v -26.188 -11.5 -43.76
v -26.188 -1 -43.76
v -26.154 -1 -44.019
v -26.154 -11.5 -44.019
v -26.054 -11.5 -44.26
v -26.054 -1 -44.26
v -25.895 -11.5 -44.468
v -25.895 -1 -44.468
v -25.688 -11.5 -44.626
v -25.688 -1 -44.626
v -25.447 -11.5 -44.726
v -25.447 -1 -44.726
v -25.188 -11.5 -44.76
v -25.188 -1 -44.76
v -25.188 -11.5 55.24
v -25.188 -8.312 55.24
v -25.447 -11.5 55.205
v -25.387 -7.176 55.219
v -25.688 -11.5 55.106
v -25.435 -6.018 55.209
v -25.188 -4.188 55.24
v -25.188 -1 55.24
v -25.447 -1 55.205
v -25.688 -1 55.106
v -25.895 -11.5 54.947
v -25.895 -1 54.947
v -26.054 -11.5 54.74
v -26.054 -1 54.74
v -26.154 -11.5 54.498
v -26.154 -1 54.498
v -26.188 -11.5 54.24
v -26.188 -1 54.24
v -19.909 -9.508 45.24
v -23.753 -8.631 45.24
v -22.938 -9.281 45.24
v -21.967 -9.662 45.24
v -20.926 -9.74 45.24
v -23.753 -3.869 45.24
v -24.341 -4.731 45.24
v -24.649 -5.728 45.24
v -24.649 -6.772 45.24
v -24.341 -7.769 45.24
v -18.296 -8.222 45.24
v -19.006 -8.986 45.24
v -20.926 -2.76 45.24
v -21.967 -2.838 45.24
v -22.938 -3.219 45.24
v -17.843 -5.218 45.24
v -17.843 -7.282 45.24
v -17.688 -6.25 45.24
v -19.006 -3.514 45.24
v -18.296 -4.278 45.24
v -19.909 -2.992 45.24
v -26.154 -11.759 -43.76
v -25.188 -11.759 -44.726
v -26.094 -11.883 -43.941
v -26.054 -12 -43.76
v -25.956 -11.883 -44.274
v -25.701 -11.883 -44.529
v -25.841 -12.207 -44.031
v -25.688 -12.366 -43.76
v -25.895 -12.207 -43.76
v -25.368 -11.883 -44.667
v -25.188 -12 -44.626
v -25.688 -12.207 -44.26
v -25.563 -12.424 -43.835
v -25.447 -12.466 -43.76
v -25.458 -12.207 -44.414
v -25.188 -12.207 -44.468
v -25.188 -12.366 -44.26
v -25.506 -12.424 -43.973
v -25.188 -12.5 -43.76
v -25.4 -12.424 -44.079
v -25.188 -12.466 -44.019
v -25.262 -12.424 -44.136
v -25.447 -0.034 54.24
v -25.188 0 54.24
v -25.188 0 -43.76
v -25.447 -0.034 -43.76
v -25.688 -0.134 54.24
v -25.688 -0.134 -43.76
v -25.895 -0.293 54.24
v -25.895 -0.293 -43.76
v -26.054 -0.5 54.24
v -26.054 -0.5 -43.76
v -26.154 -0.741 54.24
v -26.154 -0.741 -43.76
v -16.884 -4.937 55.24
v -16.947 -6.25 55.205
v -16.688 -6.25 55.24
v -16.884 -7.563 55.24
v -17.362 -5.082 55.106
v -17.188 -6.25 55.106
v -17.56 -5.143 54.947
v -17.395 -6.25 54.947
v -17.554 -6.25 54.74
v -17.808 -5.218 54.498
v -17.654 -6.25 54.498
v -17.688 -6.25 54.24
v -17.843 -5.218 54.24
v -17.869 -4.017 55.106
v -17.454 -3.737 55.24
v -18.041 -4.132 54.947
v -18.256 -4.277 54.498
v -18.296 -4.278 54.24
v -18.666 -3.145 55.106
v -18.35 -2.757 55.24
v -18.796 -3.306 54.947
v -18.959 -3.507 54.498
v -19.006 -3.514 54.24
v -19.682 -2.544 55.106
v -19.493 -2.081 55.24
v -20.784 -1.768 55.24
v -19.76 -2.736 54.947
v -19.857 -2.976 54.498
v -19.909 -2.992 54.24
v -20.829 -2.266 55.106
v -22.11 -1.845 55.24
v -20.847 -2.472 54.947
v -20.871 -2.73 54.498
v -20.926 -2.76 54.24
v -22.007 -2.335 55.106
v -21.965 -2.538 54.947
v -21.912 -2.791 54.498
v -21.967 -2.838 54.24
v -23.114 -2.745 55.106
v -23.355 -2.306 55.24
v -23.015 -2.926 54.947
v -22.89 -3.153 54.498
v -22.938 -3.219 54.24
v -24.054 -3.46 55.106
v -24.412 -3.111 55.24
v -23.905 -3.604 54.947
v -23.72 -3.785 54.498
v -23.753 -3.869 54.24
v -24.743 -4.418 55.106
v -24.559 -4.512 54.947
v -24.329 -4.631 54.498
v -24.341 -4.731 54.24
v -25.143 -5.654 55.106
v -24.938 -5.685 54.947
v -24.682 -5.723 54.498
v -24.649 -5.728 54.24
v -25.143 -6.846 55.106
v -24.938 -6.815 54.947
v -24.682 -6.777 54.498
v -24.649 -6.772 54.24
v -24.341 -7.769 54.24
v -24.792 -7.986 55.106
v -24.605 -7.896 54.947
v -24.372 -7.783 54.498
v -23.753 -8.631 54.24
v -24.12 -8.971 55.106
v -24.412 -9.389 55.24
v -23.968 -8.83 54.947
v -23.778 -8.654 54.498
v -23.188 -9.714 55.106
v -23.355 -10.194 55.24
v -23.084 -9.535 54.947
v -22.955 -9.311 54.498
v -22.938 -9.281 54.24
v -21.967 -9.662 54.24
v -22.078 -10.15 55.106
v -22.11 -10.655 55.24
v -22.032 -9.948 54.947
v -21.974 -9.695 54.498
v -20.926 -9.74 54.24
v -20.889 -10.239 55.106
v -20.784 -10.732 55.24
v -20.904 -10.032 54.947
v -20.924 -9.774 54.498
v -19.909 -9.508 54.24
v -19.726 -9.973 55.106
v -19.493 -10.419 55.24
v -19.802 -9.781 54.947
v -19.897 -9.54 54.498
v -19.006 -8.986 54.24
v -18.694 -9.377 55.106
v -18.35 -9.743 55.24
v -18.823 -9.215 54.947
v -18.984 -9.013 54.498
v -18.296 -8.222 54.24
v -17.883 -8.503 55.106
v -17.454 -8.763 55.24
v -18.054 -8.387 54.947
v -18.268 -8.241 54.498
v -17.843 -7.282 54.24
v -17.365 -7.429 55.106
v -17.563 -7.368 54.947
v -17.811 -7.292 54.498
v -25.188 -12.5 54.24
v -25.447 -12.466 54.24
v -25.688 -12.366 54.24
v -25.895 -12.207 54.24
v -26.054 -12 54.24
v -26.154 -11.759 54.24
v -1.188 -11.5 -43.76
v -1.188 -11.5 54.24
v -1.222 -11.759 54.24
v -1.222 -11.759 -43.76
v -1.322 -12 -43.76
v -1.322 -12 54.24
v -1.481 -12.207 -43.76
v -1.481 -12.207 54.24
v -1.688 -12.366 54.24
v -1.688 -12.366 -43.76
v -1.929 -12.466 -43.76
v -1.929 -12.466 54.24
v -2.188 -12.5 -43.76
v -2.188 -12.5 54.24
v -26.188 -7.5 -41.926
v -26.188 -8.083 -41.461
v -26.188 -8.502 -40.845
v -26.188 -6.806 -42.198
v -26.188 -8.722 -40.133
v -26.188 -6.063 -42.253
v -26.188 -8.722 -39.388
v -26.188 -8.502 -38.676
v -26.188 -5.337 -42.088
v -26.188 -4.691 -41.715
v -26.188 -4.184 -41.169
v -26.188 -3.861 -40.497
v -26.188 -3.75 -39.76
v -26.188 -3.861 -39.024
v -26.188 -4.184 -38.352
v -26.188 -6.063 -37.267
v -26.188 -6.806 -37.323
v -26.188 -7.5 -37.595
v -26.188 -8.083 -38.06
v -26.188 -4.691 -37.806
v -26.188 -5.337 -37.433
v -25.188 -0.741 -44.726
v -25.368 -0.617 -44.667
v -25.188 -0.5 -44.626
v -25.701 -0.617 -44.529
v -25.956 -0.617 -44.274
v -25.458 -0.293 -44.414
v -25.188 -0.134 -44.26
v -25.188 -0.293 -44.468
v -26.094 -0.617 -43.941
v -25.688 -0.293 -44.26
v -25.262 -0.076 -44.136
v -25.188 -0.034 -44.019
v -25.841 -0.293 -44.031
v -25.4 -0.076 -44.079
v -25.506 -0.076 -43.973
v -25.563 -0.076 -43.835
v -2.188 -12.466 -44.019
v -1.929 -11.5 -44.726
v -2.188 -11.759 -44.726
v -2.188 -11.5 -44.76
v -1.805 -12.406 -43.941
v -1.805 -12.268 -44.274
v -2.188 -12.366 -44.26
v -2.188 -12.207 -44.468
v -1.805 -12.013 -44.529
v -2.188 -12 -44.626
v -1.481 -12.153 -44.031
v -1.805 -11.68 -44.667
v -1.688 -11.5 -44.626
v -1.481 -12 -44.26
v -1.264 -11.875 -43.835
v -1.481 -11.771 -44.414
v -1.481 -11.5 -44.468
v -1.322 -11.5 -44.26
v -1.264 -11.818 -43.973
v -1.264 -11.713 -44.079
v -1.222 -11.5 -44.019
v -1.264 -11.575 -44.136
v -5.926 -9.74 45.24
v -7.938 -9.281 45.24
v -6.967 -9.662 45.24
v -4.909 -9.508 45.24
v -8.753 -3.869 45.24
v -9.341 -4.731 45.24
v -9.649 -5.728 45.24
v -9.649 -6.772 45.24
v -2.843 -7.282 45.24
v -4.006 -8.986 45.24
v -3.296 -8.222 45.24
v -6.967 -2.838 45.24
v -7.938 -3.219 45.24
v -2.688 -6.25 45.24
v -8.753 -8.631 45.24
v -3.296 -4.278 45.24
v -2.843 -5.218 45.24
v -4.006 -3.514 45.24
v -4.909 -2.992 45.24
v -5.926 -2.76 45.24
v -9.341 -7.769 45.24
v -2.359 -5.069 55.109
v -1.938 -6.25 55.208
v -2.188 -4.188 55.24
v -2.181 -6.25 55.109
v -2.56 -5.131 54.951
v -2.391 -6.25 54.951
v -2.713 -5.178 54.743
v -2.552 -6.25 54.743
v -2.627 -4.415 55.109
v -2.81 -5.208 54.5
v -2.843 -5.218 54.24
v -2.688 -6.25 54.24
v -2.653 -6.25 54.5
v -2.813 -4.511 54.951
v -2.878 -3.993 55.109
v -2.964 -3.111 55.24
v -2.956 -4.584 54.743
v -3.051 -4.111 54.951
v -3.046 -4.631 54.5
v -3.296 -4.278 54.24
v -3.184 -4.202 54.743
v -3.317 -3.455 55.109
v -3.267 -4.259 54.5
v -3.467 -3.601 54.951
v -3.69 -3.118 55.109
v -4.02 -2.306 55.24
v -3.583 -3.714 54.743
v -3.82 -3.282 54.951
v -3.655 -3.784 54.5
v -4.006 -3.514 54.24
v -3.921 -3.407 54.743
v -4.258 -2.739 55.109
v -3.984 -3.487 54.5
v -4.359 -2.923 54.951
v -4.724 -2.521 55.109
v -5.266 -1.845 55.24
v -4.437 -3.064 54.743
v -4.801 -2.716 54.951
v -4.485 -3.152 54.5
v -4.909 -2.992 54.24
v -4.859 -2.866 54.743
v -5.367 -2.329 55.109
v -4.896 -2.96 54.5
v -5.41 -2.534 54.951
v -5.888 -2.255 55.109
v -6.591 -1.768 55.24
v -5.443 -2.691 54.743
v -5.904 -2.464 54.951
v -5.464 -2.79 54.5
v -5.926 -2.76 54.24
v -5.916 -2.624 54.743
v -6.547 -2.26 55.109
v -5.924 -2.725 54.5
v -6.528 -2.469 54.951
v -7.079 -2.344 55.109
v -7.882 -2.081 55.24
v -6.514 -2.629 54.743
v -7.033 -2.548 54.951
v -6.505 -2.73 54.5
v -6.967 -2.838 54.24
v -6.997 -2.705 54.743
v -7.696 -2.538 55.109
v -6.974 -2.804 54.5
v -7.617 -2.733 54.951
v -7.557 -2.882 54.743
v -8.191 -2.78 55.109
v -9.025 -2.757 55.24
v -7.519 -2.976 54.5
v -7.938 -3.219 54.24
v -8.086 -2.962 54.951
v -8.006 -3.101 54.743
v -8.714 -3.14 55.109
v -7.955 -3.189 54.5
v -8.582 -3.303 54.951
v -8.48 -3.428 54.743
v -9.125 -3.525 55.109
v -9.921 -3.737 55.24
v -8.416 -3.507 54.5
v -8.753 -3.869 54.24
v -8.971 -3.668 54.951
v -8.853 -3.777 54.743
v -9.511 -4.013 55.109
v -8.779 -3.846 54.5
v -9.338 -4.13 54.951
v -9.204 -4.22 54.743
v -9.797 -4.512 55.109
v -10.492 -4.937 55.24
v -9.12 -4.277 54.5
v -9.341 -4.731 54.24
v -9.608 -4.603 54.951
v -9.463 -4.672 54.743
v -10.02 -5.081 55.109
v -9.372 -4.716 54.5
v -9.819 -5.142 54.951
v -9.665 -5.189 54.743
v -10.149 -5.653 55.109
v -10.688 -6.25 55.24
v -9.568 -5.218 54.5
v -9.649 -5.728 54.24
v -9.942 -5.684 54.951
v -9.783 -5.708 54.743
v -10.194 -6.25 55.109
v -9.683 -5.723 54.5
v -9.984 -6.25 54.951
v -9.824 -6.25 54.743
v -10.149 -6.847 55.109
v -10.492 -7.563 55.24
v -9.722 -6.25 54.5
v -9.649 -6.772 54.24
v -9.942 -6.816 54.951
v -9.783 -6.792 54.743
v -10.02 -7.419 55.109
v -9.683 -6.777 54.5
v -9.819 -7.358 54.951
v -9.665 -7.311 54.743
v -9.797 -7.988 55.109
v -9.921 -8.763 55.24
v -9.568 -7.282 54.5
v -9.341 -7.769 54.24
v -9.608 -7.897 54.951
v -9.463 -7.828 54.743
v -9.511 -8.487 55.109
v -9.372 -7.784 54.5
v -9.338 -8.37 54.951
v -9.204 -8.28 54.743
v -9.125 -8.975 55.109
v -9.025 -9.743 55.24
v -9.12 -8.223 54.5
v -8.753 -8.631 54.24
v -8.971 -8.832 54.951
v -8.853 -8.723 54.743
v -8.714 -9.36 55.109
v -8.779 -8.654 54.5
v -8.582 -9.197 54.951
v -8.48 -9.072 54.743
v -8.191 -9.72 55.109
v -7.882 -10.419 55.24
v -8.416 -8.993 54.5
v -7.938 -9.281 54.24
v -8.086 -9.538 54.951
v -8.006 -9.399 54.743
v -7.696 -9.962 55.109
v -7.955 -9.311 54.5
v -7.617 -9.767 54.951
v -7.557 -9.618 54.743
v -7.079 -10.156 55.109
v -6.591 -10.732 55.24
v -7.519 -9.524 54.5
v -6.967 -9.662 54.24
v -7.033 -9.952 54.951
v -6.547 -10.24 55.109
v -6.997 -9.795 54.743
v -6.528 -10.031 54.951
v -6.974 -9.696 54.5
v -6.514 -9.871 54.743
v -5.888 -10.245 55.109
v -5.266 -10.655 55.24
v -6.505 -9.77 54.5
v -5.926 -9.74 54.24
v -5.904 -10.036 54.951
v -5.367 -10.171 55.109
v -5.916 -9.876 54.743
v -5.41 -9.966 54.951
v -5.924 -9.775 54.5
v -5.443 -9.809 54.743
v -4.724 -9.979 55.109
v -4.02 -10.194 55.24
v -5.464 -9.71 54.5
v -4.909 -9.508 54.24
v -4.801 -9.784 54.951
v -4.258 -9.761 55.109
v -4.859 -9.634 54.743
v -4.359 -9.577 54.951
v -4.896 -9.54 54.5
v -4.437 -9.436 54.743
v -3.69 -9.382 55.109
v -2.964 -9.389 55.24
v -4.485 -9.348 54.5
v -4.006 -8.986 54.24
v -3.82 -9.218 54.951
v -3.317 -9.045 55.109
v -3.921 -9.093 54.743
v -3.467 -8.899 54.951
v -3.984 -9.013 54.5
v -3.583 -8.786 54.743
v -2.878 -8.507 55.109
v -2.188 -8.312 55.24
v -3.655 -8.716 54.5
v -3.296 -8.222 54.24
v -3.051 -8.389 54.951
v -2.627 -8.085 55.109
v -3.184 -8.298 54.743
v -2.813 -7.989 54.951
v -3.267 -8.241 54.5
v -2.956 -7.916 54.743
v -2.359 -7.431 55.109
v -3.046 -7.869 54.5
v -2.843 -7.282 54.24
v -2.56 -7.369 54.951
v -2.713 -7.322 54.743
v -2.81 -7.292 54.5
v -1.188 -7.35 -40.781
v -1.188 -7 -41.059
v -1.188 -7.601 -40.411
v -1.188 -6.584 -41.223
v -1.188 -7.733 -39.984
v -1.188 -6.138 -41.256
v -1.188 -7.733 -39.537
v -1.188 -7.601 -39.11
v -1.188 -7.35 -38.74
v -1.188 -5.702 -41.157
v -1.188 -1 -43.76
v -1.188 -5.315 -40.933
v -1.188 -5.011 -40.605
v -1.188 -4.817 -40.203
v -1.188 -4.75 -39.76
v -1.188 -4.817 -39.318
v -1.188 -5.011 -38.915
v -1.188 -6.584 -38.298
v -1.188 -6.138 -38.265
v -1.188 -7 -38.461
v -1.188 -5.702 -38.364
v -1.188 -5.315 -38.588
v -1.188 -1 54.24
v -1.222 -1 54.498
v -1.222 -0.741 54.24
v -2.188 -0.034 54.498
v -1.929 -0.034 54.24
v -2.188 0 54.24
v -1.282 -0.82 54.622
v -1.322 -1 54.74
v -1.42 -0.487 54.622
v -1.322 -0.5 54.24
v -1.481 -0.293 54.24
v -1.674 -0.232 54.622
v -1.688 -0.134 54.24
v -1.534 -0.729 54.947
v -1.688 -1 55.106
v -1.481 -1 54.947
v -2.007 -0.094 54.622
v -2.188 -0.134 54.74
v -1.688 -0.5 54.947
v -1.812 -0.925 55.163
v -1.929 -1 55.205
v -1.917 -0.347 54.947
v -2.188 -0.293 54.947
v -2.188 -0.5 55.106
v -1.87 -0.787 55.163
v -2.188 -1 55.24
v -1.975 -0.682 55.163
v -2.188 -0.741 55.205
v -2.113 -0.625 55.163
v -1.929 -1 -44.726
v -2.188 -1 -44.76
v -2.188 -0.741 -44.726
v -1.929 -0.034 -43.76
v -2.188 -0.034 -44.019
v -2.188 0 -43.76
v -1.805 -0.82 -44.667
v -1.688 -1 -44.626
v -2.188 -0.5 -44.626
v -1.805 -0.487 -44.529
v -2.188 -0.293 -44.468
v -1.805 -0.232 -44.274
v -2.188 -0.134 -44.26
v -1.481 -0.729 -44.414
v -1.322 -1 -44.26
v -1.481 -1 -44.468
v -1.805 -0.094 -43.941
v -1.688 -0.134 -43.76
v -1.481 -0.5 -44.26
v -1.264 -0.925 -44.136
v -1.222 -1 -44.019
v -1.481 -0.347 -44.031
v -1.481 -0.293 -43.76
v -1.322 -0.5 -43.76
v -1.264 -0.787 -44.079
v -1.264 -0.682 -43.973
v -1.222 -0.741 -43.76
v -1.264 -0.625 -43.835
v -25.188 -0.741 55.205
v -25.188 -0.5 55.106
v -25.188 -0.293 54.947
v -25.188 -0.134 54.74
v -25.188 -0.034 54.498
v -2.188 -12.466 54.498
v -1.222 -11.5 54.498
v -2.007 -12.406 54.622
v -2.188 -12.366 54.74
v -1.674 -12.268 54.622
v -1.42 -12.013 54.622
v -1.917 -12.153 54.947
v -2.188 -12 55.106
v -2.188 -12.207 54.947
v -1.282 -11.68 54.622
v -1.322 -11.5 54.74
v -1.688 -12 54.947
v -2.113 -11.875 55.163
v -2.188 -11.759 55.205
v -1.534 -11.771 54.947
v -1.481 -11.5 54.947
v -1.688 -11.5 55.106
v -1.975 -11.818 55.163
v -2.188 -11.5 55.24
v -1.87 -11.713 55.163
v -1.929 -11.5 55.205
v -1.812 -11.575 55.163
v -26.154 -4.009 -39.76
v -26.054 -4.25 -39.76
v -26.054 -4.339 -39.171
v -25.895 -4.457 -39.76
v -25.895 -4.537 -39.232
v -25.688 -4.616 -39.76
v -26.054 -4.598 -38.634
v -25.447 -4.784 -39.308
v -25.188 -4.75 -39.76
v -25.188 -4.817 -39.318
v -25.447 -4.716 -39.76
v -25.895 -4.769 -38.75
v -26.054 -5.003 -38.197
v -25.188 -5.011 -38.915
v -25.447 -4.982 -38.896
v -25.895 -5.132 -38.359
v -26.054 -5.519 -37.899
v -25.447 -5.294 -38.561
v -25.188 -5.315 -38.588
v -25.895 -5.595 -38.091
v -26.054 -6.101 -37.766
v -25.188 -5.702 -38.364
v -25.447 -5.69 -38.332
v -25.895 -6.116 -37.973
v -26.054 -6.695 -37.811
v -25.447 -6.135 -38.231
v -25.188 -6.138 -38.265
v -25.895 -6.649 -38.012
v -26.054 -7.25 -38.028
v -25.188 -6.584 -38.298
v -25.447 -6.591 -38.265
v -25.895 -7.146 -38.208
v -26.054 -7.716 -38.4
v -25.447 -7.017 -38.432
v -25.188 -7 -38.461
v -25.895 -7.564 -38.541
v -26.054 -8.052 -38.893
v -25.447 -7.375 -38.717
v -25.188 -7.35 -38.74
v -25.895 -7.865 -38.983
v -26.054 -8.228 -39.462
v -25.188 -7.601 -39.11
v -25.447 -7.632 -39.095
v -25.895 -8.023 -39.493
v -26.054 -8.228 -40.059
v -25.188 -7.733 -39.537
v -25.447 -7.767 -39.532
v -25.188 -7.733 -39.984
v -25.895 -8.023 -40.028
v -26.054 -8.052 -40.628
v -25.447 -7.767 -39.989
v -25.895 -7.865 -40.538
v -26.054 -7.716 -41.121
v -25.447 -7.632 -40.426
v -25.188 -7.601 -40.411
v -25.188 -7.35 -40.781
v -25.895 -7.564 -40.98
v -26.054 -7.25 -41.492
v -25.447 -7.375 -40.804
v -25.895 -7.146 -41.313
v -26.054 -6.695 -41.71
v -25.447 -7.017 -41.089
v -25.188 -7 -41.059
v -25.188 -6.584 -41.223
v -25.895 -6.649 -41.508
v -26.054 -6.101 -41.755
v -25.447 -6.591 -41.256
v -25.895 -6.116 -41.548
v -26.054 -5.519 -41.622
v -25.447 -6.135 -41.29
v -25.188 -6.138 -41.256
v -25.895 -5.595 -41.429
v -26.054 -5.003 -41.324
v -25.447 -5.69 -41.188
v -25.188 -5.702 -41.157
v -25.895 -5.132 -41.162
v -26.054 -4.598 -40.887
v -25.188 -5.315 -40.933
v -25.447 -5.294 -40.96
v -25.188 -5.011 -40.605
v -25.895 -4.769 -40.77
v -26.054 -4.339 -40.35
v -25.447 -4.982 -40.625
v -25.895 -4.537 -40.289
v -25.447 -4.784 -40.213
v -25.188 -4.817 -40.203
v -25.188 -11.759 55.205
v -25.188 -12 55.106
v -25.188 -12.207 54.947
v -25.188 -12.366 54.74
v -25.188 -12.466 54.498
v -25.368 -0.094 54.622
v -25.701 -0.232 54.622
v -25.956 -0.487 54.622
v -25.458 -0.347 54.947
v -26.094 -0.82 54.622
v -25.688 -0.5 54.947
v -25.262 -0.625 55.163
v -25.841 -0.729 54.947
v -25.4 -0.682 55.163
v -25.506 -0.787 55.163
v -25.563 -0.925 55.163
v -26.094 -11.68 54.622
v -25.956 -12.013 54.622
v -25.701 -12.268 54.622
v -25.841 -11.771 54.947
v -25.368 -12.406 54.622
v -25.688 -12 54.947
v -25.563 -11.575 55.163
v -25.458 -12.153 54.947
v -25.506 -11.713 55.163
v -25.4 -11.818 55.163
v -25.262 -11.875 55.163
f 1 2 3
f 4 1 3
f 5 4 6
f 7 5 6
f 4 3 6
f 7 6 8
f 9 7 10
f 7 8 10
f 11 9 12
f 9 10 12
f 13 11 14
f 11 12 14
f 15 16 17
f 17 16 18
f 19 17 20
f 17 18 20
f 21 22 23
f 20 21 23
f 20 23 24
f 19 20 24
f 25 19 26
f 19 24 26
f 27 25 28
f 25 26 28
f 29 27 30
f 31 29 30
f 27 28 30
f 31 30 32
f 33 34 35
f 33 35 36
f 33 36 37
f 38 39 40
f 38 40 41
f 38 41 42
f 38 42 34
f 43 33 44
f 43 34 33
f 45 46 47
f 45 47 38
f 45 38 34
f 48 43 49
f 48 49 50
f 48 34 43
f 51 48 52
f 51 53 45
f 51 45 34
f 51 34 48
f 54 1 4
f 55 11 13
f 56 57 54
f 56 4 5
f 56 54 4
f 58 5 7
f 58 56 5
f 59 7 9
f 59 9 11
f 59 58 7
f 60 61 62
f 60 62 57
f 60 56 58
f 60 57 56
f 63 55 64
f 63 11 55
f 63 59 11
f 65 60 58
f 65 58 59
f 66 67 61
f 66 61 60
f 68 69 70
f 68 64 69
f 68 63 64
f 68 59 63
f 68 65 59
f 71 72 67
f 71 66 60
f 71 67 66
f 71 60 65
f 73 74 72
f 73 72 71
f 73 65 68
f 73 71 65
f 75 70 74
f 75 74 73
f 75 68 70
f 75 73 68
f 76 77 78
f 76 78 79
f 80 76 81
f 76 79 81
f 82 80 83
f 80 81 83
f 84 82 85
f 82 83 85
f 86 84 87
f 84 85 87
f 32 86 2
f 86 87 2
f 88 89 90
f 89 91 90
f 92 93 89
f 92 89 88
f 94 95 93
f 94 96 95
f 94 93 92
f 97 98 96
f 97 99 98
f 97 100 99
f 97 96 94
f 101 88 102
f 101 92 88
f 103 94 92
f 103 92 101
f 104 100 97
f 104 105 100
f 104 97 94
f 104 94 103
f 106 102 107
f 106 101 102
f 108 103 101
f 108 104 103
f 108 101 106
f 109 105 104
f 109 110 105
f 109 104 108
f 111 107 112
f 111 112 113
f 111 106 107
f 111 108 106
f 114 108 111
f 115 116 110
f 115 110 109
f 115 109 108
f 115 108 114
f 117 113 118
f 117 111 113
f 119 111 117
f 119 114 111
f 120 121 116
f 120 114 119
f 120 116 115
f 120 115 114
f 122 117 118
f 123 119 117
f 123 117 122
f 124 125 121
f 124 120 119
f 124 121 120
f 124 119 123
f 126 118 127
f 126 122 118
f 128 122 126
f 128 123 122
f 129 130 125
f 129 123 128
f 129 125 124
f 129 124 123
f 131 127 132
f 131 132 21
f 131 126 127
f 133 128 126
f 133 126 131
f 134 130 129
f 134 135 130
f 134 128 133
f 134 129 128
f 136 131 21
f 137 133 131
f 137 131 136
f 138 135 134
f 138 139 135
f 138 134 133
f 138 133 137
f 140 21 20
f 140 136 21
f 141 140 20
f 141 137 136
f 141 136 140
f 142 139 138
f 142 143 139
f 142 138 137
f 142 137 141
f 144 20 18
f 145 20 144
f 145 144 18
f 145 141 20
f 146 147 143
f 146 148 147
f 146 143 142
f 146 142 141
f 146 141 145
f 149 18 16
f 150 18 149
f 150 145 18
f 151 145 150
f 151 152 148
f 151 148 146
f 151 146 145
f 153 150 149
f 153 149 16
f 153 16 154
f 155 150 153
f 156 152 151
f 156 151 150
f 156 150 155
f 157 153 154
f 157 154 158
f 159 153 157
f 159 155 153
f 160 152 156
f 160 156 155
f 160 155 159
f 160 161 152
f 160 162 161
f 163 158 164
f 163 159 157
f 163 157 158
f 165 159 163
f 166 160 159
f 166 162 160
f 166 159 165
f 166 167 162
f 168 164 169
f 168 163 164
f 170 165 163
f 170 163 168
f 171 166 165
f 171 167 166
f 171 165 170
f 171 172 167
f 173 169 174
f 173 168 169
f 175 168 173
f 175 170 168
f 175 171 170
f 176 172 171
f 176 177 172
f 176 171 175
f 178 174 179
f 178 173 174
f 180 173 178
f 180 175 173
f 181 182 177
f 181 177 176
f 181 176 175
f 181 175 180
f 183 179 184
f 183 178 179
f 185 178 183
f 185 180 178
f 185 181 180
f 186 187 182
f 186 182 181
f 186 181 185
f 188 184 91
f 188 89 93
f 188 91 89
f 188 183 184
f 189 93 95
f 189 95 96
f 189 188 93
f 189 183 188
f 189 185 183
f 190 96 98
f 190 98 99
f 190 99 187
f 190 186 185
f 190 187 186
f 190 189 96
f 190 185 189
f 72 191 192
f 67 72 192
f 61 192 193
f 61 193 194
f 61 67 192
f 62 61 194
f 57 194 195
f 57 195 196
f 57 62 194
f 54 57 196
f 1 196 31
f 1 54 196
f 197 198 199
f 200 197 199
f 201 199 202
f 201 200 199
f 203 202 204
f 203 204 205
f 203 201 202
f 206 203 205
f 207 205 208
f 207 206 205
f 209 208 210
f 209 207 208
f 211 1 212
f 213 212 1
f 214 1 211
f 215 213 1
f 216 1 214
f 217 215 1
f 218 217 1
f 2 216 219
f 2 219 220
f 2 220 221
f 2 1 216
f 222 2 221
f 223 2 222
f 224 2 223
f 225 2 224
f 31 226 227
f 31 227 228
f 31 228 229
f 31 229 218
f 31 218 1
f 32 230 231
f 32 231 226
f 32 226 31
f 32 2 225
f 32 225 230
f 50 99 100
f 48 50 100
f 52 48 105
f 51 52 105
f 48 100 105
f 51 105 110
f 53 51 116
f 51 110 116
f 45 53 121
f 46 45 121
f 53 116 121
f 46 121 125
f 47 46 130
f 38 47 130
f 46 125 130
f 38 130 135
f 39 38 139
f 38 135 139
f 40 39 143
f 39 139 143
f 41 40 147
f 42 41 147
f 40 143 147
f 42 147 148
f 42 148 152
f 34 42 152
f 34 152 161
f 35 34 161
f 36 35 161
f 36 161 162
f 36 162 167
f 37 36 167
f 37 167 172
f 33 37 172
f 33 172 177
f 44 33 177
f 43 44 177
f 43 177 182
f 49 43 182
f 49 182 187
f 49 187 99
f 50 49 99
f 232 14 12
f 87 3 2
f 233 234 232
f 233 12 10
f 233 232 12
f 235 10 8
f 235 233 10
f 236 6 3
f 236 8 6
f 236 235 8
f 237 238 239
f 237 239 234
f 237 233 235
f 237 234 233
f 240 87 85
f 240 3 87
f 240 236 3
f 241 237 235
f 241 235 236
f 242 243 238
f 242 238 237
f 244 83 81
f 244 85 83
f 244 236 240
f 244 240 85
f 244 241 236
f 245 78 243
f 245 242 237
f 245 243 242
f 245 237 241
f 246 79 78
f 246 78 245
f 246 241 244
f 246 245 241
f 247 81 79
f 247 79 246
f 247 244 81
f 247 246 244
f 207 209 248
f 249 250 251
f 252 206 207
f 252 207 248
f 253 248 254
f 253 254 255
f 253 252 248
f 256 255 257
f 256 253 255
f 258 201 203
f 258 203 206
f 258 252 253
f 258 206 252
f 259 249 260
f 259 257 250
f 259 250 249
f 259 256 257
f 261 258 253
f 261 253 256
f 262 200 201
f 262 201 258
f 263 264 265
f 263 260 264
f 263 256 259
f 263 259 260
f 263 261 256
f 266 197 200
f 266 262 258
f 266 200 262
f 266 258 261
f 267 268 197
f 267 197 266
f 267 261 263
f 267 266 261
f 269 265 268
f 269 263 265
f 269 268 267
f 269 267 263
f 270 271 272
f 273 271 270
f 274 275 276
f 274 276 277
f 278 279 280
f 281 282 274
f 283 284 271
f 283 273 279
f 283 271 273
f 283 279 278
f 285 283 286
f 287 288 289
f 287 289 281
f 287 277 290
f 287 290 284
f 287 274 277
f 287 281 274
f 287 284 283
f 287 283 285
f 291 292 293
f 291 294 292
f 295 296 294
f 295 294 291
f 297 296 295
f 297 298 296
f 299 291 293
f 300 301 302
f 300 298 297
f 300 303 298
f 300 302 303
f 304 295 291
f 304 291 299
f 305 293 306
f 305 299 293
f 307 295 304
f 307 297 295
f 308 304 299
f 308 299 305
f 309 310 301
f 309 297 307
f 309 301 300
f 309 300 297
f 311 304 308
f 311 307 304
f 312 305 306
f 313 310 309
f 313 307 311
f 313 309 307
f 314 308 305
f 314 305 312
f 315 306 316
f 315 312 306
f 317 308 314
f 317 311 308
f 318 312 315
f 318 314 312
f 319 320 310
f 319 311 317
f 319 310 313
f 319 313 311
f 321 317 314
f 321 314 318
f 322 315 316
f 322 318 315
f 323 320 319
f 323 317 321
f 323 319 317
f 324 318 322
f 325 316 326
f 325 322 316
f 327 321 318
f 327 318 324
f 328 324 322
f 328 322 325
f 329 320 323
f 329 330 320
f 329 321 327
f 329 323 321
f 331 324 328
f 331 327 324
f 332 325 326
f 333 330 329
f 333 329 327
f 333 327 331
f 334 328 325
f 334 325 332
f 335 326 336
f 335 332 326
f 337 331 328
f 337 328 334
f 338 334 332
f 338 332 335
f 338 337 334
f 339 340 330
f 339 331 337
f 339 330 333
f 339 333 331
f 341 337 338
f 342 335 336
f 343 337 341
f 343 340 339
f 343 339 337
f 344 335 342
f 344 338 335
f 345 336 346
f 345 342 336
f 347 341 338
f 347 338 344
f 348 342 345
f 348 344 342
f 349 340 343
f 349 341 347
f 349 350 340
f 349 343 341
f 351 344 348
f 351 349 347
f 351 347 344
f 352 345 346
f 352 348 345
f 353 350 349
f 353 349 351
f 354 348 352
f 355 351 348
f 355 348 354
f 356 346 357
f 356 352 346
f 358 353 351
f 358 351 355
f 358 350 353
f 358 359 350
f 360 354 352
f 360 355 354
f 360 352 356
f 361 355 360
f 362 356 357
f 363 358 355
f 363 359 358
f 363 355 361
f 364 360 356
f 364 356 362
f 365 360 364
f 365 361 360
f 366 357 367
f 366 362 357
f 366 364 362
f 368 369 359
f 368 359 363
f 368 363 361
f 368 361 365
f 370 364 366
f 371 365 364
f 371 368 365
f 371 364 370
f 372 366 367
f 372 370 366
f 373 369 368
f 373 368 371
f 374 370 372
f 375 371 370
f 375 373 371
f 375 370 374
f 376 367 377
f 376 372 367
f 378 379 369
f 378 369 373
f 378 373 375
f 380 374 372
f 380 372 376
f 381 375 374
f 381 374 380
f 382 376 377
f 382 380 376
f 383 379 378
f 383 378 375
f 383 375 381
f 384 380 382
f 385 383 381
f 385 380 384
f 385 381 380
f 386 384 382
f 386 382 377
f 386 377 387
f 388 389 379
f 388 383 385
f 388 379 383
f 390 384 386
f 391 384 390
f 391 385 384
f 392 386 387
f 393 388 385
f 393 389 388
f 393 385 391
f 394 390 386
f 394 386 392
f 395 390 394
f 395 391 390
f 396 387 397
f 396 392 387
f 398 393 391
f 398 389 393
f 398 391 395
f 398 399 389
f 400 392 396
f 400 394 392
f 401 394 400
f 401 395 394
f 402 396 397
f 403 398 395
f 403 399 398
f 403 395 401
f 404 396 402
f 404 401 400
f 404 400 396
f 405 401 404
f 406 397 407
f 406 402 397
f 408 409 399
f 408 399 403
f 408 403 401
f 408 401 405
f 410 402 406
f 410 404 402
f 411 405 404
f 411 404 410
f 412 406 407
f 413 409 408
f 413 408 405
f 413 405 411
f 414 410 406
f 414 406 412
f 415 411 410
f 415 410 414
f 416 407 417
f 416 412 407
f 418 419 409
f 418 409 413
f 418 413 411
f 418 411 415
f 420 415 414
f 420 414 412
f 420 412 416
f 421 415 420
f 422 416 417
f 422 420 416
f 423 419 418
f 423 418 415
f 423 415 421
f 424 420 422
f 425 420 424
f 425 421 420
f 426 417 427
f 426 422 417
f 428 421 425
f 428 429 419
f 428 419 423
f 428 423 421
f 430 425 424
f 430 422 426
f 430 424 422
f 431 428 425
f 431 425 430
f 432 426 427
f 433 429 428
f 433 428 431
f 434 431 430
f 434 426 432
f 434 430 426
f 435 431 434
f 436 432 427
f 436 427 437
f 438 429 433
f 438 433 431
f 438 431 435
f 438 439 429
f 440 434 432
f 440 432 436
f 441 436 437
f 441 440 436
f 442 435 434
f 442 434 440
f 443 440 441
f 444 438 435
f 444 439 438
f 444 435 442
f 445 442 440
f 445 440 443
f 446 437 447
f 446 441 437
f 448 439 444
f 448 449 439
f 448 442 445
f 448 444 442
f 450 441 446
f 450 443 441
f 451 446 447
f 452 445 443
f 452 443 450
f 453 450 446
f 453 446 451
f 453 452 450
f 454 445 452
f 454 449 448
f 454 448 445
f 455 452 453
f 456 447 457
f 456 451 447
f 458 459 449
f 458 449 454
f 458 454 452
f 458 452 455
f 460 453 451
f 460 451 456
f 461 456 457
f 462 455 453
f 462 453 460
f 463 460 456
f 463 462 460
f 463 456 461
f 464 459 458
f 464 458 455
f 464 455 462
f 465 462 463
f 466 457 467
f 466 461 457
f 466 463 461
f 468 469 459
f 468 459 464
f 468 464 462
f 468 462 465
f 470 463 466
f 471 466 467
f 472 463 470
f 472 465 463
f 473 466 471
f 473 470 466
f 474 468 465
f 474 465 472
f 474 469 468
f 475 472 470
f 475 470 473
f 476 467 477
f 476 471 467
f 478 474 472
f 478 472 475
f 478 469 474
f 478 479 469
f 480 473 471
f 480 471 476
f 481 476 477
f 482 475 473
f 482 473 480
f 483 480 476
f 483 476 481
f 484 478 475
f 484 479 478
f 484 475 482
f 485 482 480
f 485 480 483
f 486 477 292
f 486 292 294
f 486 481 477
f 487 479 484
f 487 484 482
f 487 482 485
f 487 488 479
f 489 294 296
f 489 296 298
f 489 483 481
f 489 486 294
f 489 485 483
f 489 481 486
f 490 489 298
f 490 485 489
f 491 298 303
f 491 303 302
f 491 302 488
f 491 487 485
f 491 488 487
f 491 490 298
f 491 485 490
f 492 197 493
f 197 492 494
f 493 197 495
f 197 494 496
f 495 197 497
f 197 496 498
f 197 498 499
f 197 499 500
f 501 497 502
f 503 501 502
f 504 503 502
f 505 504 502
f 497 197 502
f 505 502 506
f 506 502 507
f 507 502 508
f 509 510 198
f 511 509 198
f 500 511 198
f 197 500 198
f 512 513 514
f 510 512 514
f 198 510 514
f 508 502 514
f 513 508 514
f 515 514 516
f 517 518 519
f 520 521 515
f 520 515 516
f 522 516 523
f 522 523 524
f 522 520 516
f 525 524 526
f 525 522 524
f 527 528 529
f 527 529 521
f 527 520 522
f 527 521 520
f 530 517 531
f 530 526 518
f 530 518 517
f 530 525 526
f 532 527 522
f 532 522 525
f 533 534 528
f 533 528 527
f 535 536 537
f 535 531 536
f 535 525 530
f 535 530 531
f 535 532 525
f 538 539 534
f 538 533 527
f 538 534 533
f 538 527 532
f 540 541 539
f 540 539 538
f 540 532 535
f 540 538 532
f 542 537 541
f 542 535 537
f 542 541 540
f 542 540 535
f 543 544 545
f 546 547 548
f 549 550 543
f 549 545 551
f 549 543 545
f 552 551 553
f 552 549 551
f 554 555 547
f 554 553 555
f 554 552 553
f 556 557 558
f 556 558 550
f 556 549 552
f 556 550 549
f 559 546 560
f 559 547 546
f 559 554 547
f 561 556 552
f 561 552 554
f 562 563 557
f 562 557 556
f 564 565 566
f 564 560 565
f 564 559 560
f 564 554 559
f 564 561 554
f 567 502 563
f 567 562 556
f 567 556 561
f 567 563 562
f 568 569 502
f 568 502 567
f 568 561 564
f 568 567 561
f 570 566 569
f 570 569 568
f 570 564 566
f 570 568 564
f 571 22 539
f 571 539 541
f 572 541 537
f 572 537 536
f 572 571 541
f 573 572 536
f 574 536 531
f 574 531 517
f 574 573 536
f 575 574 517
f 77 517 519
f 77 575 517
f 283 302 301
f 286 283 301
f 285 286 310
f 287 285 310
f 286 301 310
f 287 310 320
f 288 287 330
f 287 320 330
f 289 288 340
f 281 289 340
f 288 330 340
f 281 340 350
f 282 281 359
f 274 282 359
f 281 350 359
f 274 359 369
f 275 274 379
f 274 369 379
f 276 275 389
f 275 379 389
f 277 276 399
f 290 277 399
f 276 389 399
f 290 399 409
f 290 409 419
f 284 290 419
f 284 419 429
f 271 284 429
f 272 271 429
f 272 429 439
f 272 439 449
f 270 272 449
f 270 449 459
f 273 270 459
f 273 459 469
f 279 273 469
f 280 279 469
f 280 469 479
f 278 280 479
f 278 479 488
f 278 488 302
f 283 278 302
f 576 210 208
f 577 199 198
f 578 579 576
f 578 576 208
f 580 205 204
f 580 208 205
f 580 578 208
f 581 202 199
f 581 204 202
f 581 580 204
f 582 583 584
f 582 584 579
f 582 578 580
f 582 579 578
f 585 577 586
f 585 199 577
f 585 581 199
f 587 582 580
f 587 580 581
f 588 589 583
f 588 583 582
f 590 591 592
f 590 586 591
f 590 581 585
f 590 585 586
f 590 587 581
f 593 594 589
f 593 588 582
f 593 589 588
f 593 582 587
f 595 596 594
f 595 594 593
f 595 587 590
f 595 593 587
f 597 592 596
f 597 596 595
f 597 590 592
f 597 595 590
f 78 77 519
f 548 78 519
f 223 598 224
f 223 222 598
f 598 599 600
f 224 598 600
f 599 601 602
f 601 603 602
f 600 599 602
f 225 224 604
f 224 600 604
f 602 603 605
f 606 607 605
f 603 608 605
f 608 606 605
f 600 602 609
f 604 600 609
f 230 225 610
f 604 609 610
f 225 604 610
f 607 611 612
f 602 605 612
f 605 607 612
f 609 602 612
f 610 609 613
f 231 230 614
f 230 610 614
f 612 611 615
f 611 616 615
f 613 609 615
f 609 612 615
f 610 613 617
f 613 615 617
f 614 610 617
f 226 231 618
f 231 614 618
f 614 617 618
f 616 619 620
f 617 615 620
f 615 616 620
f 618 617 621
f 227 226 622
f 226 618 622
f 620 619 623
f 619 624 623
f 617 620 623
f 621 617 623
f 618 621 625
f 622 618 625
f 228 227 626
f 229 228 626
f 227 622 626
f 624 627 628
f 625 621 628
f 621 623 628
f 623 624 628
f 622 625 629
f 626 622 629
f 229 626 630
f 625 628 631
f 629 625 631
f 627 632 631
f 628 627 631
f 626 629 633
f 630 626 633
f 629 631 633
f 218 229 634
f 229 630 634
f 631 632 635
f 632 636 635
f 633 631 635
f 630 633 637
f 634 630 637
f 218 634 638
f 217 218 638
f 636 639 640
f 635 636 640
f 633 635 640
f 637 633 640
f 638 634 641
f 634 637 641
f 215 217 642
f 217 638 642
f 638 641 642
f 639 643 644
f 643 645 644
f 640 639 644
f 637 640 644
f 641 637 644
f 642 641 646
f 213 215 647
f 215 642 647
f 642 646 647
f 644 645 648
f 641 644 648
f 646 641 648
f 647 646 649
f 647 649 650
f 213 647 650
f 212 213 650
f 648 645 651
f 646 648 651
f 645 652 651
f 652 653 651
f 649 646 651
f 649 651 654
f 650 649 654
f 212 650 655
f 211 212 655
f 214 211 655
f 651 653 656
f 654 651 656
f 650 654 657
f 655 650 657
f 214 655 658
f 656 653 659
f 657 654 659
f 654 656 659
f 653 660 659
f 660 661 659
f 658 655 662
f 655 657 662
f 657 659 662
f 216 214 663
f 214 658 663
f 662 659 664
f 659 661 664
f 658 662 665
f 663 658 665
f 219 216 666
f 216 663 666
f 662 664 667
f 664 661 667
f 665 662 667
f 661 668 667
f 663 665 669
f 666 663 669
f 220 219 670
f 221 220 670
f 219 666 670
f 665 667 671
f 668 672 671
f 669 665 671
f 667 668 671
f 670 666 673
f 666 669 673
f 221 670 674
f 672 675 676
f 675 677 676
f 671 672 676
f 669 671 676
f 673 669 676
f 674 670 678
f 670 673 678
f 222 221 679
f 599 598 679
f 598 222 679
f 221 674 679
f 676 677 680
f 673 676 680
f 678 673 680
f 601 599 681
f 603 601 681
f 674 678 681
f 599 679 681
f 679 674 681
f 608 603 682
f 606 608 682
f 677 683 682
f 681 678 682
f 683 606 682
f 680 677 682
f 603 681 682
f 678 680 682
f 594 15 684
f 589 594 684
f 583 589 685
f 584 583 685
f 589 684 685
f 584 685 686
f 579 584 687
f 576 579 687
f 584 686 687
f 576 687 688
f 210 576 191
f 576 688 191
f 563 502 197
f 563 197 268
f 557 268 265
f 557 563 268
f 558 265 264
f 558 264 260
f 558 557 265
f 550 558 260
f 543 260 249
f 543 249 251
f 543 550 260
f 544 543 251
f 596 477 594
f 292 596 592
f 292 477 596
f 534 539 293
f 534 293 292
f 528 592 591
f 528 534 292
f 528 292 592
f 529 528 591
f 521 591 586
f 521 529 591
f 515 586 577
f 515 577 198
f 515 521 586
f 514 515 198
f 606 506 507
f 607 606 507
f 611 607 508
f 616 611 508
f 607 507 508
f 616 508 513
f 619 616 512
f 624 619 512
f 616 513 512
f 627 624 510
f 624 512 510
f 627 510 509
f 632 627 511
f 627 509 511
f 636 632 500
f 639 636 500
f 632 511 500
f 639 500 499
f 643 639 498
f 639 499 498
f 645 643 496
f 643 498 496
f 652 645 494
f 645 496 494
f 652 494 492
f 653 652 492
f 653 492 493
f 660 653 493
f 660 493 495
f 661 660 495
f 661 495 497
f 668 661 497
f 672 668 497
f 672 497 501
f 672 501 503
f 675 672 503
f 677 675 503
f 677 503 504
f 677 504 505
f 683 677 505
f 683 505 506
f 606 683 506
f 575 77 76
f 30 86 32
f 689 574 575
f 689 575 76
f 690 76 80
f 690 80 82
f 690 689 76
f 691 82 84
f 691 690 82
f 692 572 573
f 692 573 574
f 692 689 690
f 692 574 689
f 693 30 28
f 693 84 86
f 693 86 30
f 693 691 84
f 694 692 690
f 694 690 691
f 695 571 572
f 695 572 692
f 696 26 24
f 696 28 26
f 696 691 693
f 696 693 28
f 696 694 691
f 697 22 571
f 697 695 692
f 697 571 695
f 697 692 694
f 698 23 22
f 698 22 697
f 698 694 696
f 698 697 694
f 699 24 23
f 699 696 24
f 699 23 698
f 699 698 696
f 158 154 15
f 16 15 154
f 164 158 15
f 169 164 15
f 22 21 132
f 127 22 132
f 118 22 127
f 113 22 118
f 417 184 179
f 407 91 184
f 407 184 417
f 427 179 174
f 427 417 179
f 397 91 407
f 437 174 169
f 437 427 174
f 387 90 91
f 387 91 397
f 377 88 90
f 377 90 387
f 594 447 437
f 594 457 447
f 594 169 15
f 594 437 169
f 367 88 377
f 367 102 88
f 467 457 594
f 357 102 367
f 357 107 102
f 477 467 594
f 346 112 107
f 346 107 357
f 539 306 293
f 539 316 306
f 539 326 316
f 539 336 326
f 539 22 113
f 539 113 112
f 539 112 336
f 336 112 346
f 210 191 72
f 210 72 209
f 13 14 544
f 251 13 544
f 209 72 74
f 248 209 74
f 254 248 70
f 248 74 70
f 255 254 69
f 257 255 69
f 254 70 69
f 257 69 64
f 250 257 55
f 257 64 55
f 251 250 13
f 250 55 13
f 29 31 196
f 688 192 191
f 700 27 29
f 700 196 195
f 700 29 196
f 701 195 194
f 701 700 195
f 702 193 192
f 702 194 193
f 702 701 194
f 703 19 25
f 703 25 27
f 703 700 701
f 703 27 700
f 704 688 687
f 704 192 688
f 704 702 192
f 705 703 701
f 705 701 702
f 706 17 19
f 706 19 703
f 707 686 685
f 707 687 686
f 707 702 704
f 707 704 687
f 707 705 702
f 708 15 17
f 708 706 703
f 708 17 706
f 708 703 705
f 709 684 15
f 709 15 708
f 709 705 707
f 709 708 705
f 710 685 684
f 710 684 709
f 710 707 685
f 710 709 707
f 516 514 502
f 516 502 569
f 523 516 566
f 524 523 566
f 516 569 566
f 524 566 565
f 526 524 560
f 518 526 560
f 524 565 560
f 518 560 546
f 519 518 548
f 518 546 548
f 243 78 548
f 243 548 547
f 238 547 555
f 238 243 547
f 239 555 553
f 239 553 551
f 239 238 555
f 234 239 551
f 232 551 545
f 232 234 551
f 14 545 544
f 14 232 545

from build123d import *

# Parameters (mm, degrees)
F0_W         = 25
F0_H         = 100
F1_DEPTH     = 12.5
F2_R         = 1.5
F3_DEPTH     = 27.19003
F4_R         = 3.5
F5_DEPTH     = 10
F6_T1_DEPTH  = 10.5
F6_T3_DEPTH  = 23
F6_T5_DEPTH  = 98
F6_S9_W      = 1
F6_S9_H      = 1
F6_T10_DEPTH = 1
F6_S15_W     = 1
F6_S15_H     = 1
F6_T16_DEPTH = 1
F6_S21_W     = 1
F6_S21_H     = 1
F6_T22_DEPTH = 1
F6_S27_W     = 1
F6_S27_H     = 1
F6_T28_DEPTH = 1
F6_S33_W     = 1
F6_S33_H     = 1
F6_T34_DEPTH = 1
F6_S39_W     = 1
F6_S39_H     = 1
F6_T40_DEPTH = 1
F6_S45_W     = 1
F6_S45_H     = 1
F6_T46_DEPTH = 1
F6_S51_W     = 1
F6_S51_H     = 1
F6_T52_DEPTH = 1


# Not quite as in the source:
# - a fillet or chamfer that OpenCascade refuses, or shapes differently, is made with other operations: its cross-section is extruded or revolved along the edge and cut away or added


with BuildPart() as f1:
    # F0 (on Front) → F1 (new body)
    with BuildSketch(Plane.XZ):
        with Locations((-13.6877183104, 5.2395616682)):
            Rectangle(F0_W, F0_H)
    extrude(amount=F1_DEPTH)

    # F2 (on Right) → F3 (cut)
    with BuildSketch(Plane.YZ):
        with Locations((-6.25, -39.7604383318)):
            Circle(F2_R)
    extrude(amount=-F3_DEPTH, mode=Mode.SUBTRACT)

    # F4 (on face) → F5 (cut)
    with BuildSketch(Plane.XY.offset(55.2395616682)):
        with Locations((-6.1877183104, -6.25)):
            Circle(F4_R)
        with Locations((-21.1877183104, -6.25)):
            Circle(F4_R)
    extrude(amount=-F5_DEPTH, mode=Mode.SUBTRACT)

    # F6: fillet of radius 1 on 15 edges, made by hand

    # F6_s2 → F6_t1 (cut)
    with BuildSketch(Plane.XZ.offset(1)):
        with BuildLine():
            ThreePointArc((-25.1877183104, 55.2395616682), (-25.8948250916, 54.9466684494), (-26.1877183104, 54.2395616682))
            Line((-26.1877183104, 54.2395616682), (-26.1877183104, 55.2395616682))
            Line((-26.1877183104, 55.2395616682), (-25.1877183104, 55.2395616682))
        make_face()
        with BuildLine():
            ThreePointArc((-2.1877183104, 55.2395616682), (-1.4806115292, 54.9466684494), (-1.1877183104, 54.2395616682))
            Line((-1.1877183104, 54.2395616682), (-1.1877183104, 55.2395616682))
            Line((-1.1877183104, 55.2395616682), (-2.1877183104, 55.2395616682))
        make_face()
        with BuildLine():
            ThreePointArc((-26.1877183104, -43.7604383318), (-25.8948250916, -44.467545113), (-25.1877183104, -44.7604383318))
            Line((-25.1877183104, -44.7604383318), (-26.1877183104, -44.7604383318))
            Line((-26.1877183104, -44.7604383318), (-26.1877183104, -43.7604383318))
        make_face()
        with BuildLine():
            ThreePointArc((-1.1877183104, -43.7604383318), (-1.4806115292, -44.467545113), (-2.1877183104, -44.7604383318))
            Line((-2.1877183104, -44.7604383318), (-1.1877183104, -44.7604383318))
            Line((-1.1877183104, -44.7604383318), (-1.1877183104, -43.7604383318))
        make_face()
    extrude(amount=F6_T1_DEPTH, mode=Mode.SUBTRACT)

    # F6_s4 → F6_t3 (cut)
    with BuildSketch(Plane.YZ.offset(-25.1877183104)):
        with BuildLine():
            ThreePointArc((-11.5, 55.2395616682), (-12.2071067812, 54.9466684494), (-12.5, 54.2395616682))
            Line((-12.5, 54.2395616682), (-12.5, 55.2395616682))
            Line((-12.5, 55.2395616682), (-11.5, 55.2395616682))
        make_face()
        with BuildLine():
            ThreePointArc((-1, 55.2395616682), (-0.2928932188, 54.9466684494), (0, 54.2395616682))
            Line((0, 54.2395616682), (0, 55.2395616682))
            Line((0, 55.2395616682), (-1, 55.2395616682))
        make_face()
        with BuildLine():
            ThreePointArc((0, -43.7604383318), (-0.2928932188, -44.467545113), (-1, -44.7604383318))
            Line((-1, -44.7604383318), (0, -44.7604383318))
            Line((0, -44.7604383318), (0, -43.7604383318))
        make_face()
        with BuildLine():
            ThreePointArc((-12.5, -43.7604383318), (-12.2071067812, -44.467545113), (-11.5, -44.7604383318))
            Line((-11.5, -44.7604383318), (-12.5, -44.7604383318))
            Line((-12.5, -44.7604383318), (-12.5, -43.7604383318))
        make_face()
    extrude(amount=F6_T3_DEPTH, mode=Mode.SUBTRACT)

    # F6_s6 → F6_t5 (cut)
    with BuildSketch(Plane.XY.offset(-43.7604383318)):
        with BuildLine():
            ThreePointArc((-25.1877183104, 0), (-25.8948250916, -0.2928932188), (-26.1877183104, -1))
            Line((-26.1877183104, -1), (-26.1877183104, 0))
            Line((-26.1877183104, 0), (-25.1877183104, 0))
        make_face()
        with BuildLine():
            ThreePointArc((-1.1877183104, -1), (-1.4806115292, -0.2928932188), (-2.1877183104, 0))
            Line((-2.1877183104, 0), (-1.1877183104, 0))
            Line((-1.1877183104, 0), (-1.1877183104, -1))
        make_face()
        with BuildLine():
            ThreePointArc((-25.1877183104, -12.5), (-25.8948250916, -12.2071067812), (-26.1877183104, -11.5))
            Line((-26.1877183104, -11.5), (-26.1877183104, -12.5))
            Line((-26.1877183104, -12.5), (-25.1877183104, -12.5))
        make_face()
        with BuildLine():
            ThreePointArc((-1.1877183104, -11.5), (-1.4806115292, -12.2071067812), (-2.1877183104, -12.5))
            Line((-2.1877183104, -12.5), (-1.1877183104, -12.5))
            Line((-1.1877183104, -12.5), (-1.1877183104, -11.5))
        make_face()
    extrude(amount=F6_T5_DEPTH, mode=Mode.SUBTRACT)


with BuildPart() as f6_tool8:
    # F6_s9 → F6_t10 (new body)
    with BuildSketch(Plane.XY.offset(54.2395616682)):
        with Locations((-25.6877183104, -0.5)):
            Rectangle(F6_S9_W, F6_S9_H)
    extrude(amount=F6_T10_DEPTH)

    # F6_s11 → F6_t12 (revolve, cut)
    with BuildSketch(Plane(origin=(-25.1877183104, -1, 54.2395616682), x_dir=(0.7071067812, -0.7071067812, 0), z_dir=(-0.7071067812, -0.7071067812, 0))):
        with BuildLine():
            ThreePointArc((0, -1), (1, 0), (0, 1))
            Line((0, 1), (0, -1))
        make_face()
    revolve(axis=Axis((-25.1877183104, -1, 54.2395616682), (0, 0, 1)), mode=Mode.SUBTRACT)


with BuildPart() as f1_1:
    add(f1.part)

    # F6_t7: cut F6_tool8
    add(f6_tool8.part, mode=Mode.SUBTRACT)


with BuildPart() as f6_tool14:
    # F6_s15 → F6_t16 (new body)
    with BuildSketch(Plane.XY.offset(54.2395616682)):
        with Locations((-25.6877183104, -12)):
            Rectangle(F6_S15_W, F6_S15_H)
    extrude(amount=F6_T16_DEPTH)

    # F6_s17 → F6_t18 (revolve, cut)
    with BuildSketch(Plane(origin=(-25.1877183104, -11.5, 54.2395616682), x_dir=(0.7071067812, 0.7071067812, 0), z_dir=(0.7071067812, -0.7071067812, 0))):
        with BuildLine():
            ThreePointArc((0, -1), (1, 0), (0, 1))
            Line((0, 1), (0, -1))
        make_face()
    revolve(axis=Axis((-25.1877183104, -11.5, 54.2395616682), (0, 0, 1)), mode=Mode.SUBTRACT)


with BuildPart() as f1_2:
    add(f1_1.part)

    # F6_t13: cut F6_tool14
    add(f6_tool14.part, mode=Mode.SUBTRACT)


with BuildPart() as f6_tool20:
    # F6_s21 → F6_t22 (new body)
    with BuildSketch(Plane.XY.offset(54.2395616682)):
        with Locations((-1.6877183104, -12)):
            Rectangle(F6_S21_W, F6_S21_H)
    extrude(amount=F6_T22_DEPTH)

    # F6_s23 → F6_t24 (revolve, cut)
    with BuildSketch(Plane(origin=(-2.1877183104, -11.5, 54.2395616682), x_dir=(-0.7071067812, 0.7071067812, 0), z_dir=(0.7071067812, 0.7071067812, 0))):
        with BuildLine():
            ThreePointArc((0, -1), (1, 0), (0, 1))
            Line((0, 1), (0, -1))
        make_face()
    revolve(axis=Axis((-2.1877183104, -11.5, 54.2395616682), (0, 0, 1)), mode=Mode.SUBTRACT)


with BuildPart() as f1_3:
    add(f1_2.part)

    # F6_t19: cut F6_tool20
    add(f6_tool20.part, mode=Mode.SUBTRACT)


with BuildPart() as f6_tool26:
    # F6_s27 → F6_t28 (new body)
    with BuildSketch(Plane.XY.offset(54.2395616682)):
        with Locations((-1.6877183104, -0.5)):
            Rectangle(F6_S27_W, F6_S27_H)
    extrude(amount=F6_T28_DEPTH)

    # F6_s29 → F6_t30 (revolve, cut)
    with BuildSketch(Plane(origin=(-2.1877183104, -1, 54.2395616682), x_dir=(-0.7071067812, -0.7071067812, 0), z_dir=(-0.7071067812, 0.7071067812, 0))):
        with BuildLine():
            ThreePointArc((0, -1), (1, 0), (0, 1))
            Line((0, 1), (0, -1))
        make_face()
    revolve(axis=Axis((-2.1877183104, -1, 54.2395616682), (0, 0, 1)), mode=Mode.SUBTRACT)


with BuildPart() as f1_4:
    add(f1_3.part)

    # F6_t25: cut F6_tool26
    add(f6_tool26.part, mode=Mode.SUBTRACT)


with BuildPart() as f6_tool32:
    # F6_s33 → F6_t34 (new body)
    with BuildSketch(Plane.XZ.offset(1)):
        with Locations((-25.6877183104, -44.2604383318)):
            Rectangle(F6_S33_W, F6_S33_H)
    extrude(amount=-F6_T34_DEPTH)

    # F6_s35 → F6_t36 (revolve, cut)
    with BuildSketch(Plane(origin=(-25.1877183104, -1, -43.7604383318), x_dir=(0.7071067812, 0, 0.7071067812), z_dir=(-0.7071067812, 0, 0.7071067812))):
        with BuildLine():
            ThreePointArc((0, -1), (1, 0), (0, 1))
            Line((0, 1), (0, -1))
        make_face()
    revolve(axis=Axis((-25.1877183104, -1, -43.7604383318), (0, 1, 0)), mode=Mode.SUBTRACT)


with BuildPart() as f1_5:
    add(f1_4.part)

    # F6_t31: cut F6_tool32
    add(f6_tool32.part, mode=Mode.SUBTRACT)


with BuildPart() as f6_tool38:
    # F6_s39 → F6_t40 (new body)
    with BuildSketch(Plane.YZ.offset(-2.1877183104)):
        with Locations((-0.5, -44.2604383318)):
            Rectangle(F6_S39_W, F6_S39_H)
    extrude(amount=F6_T40_DEPTH)

    # F6_s41 → F6_t42 (revolve, cut)
    with BuildSketch(Plane(origin=(-2.1877183104, -1, -43.7604383318), x_dir=(0, -0.7071067812, 0.7071067812), z_dir=(0, 0.7071067812, 0.7071067812))):
        with BuildLine():
            ThreePointArc((0, -1), (1, 0), (0, 1))
            Line((0, 1), (0, -1))
        make_face()
    revolve(axis=Axis((-2.1877183104, -1, -43.7604383318), (1, 0, 0)), mode=Mode.SUBTRACT)


with BuildPart() as f1_6:
    add(f1_5.part)

    # F6_t37: cut F6_tool38
    add(f6_tool38.part, mode=Mode.SUBTRACT)


with BuildPart() as f6_tool44:
    # F6_s45 → F6_t46 (new body)
    with BuildSketch(Plane.XZ.offset(11.5)):
        with Locations((-25.6877183104, -44.2604383318)):
            Rectangle(F6_S45_W, F6_S45_H)
    extrude(amount=F6_T46_DEPTH)

    # F6_s47 → F6_t48 (revolve, cut)
    with BuildSketch(Plane(origin=(-25.1877183104, -11.5, -43.7604383318), x_dir=(0.7071067812, 0, 0.7071067812), z_dir=(0.7071067812, 0, -0.7071067812))):
        with BuildLine():
            ThreePointArc((0, -1), (1, 0), (0, 1))
            Line((0, 1), (0, -1))
        make_face()
    revolve(axis=Axis((-25.1877183104, -11.5, -43.7604383318), (0, -1, 0)), mode=Mode.SUBTRACT)


with BuildPart() as f1_7:
    add(f1_6.part)

    # F6_t43: cut F6_tool44
    add(f6_tool44.part, mode=Mode.SUBTRACT)


with BuildPart() as f6_tool50:
    # F6_s51 → F6_t52 (new body)
    with BuildSketch(Plane.YZ.offset(-2.1877183104)):
        with Locations((-12, -44.2604383318)):
            Rectangle(F6_S51_W, F6_S51_H)
    extrude(amount=F6_T52_DEPTH)

    # F6_s53 → F6_t54 (revolve, cut)
    with BuildSketch(Plane(origin=(-2.1877183104, -11.5, -43.7604383318), x_dir=(0, 0.7071067812, 0.7071067812), z_dir=(0, 0.7071067812, -0.7071067812))):
        with BuildLine():
            ThreePointArc((0, -1), (1, 0), (0, 1))
            Line((0, 1), (0, -1))
        make_face()
    revolve(axis=Axis((-2.1877183104, -11.5, -43.7604383318), (1, 0, 0)), mode=Mode.SUBTRACT)


with BuildPart() as f1_8:
    add(f1_7.part)

    # F6_t49: cut F6_tool50
    add(f6_tool50.part, mode=Mode.SUBTRACT)

    # F6_s55 → F6_t56 (revolve, cut)
    with BuildSketch(Plane.XY.offset(-39.7604383318)):
        with BuildLine():
            ThreePointArc((-26.1877183104, -3.75), (-25.8948250916, -4.4571067812), (-25.1877183104, -4.75))
            Line((-25.1877183104, -4.75), (-26.1877183104, -4.75))
            Line((-26.1877183104, -4.75), (-26.1877183104, -3.75))
        make_face()
    revolve(axis=Axis((-26.1877183104, -6.25, -39.7604383318), (1, 0, 0)), mode=Mode.SUBTRACT)

    # F6_s57 → F6_t58 (revolve, cut)
    with BuildSketch(Plane.XZ.offset(6.25)):
        with BuildLine():
            ThreePointArc((-16.6877183104, 55.2395616682), (-17.3948250916, 54.9466684494), (-17.6877183104, 54.2395616682))
            Line((-17.6877183104, 54.2395616682), (-17.6877183104, 55.2395616682))
            Line((-17.6877183104, 55.2395616682), (-16.6877183104, 55.2395616682))
        make_face()
    revolve(axis=Axis((-21.1877183104, -6.25, 55.2395616682), (0, 0, 1)), mode=Mode.SUBTRACT)

    # F6_s59 → F6_t60 (revolve, cut)
    with BuildSketch(Plane.XZ.offset(6.25)):
        with BuildLine():
            ThreePointArc((-1.6877183104, 55.2395616682), (-2.3948250916, 54.9466684494), (-2.6877183104, 54.2395616682))
            Line((-2.6877183104, 54.2395616682), (-2.6877183104, 55.2395616682))
            Line((-2.6877183104, 55.2395616682), (-1.6877183104, 55.2395616682))
        make_face()
    revolve(axis=Axis((-6.1877183104, -6.25, 55.2395616682), (0, 0, 1)), mode=Mode.SUBTRACT)


solid = f1_8.part
